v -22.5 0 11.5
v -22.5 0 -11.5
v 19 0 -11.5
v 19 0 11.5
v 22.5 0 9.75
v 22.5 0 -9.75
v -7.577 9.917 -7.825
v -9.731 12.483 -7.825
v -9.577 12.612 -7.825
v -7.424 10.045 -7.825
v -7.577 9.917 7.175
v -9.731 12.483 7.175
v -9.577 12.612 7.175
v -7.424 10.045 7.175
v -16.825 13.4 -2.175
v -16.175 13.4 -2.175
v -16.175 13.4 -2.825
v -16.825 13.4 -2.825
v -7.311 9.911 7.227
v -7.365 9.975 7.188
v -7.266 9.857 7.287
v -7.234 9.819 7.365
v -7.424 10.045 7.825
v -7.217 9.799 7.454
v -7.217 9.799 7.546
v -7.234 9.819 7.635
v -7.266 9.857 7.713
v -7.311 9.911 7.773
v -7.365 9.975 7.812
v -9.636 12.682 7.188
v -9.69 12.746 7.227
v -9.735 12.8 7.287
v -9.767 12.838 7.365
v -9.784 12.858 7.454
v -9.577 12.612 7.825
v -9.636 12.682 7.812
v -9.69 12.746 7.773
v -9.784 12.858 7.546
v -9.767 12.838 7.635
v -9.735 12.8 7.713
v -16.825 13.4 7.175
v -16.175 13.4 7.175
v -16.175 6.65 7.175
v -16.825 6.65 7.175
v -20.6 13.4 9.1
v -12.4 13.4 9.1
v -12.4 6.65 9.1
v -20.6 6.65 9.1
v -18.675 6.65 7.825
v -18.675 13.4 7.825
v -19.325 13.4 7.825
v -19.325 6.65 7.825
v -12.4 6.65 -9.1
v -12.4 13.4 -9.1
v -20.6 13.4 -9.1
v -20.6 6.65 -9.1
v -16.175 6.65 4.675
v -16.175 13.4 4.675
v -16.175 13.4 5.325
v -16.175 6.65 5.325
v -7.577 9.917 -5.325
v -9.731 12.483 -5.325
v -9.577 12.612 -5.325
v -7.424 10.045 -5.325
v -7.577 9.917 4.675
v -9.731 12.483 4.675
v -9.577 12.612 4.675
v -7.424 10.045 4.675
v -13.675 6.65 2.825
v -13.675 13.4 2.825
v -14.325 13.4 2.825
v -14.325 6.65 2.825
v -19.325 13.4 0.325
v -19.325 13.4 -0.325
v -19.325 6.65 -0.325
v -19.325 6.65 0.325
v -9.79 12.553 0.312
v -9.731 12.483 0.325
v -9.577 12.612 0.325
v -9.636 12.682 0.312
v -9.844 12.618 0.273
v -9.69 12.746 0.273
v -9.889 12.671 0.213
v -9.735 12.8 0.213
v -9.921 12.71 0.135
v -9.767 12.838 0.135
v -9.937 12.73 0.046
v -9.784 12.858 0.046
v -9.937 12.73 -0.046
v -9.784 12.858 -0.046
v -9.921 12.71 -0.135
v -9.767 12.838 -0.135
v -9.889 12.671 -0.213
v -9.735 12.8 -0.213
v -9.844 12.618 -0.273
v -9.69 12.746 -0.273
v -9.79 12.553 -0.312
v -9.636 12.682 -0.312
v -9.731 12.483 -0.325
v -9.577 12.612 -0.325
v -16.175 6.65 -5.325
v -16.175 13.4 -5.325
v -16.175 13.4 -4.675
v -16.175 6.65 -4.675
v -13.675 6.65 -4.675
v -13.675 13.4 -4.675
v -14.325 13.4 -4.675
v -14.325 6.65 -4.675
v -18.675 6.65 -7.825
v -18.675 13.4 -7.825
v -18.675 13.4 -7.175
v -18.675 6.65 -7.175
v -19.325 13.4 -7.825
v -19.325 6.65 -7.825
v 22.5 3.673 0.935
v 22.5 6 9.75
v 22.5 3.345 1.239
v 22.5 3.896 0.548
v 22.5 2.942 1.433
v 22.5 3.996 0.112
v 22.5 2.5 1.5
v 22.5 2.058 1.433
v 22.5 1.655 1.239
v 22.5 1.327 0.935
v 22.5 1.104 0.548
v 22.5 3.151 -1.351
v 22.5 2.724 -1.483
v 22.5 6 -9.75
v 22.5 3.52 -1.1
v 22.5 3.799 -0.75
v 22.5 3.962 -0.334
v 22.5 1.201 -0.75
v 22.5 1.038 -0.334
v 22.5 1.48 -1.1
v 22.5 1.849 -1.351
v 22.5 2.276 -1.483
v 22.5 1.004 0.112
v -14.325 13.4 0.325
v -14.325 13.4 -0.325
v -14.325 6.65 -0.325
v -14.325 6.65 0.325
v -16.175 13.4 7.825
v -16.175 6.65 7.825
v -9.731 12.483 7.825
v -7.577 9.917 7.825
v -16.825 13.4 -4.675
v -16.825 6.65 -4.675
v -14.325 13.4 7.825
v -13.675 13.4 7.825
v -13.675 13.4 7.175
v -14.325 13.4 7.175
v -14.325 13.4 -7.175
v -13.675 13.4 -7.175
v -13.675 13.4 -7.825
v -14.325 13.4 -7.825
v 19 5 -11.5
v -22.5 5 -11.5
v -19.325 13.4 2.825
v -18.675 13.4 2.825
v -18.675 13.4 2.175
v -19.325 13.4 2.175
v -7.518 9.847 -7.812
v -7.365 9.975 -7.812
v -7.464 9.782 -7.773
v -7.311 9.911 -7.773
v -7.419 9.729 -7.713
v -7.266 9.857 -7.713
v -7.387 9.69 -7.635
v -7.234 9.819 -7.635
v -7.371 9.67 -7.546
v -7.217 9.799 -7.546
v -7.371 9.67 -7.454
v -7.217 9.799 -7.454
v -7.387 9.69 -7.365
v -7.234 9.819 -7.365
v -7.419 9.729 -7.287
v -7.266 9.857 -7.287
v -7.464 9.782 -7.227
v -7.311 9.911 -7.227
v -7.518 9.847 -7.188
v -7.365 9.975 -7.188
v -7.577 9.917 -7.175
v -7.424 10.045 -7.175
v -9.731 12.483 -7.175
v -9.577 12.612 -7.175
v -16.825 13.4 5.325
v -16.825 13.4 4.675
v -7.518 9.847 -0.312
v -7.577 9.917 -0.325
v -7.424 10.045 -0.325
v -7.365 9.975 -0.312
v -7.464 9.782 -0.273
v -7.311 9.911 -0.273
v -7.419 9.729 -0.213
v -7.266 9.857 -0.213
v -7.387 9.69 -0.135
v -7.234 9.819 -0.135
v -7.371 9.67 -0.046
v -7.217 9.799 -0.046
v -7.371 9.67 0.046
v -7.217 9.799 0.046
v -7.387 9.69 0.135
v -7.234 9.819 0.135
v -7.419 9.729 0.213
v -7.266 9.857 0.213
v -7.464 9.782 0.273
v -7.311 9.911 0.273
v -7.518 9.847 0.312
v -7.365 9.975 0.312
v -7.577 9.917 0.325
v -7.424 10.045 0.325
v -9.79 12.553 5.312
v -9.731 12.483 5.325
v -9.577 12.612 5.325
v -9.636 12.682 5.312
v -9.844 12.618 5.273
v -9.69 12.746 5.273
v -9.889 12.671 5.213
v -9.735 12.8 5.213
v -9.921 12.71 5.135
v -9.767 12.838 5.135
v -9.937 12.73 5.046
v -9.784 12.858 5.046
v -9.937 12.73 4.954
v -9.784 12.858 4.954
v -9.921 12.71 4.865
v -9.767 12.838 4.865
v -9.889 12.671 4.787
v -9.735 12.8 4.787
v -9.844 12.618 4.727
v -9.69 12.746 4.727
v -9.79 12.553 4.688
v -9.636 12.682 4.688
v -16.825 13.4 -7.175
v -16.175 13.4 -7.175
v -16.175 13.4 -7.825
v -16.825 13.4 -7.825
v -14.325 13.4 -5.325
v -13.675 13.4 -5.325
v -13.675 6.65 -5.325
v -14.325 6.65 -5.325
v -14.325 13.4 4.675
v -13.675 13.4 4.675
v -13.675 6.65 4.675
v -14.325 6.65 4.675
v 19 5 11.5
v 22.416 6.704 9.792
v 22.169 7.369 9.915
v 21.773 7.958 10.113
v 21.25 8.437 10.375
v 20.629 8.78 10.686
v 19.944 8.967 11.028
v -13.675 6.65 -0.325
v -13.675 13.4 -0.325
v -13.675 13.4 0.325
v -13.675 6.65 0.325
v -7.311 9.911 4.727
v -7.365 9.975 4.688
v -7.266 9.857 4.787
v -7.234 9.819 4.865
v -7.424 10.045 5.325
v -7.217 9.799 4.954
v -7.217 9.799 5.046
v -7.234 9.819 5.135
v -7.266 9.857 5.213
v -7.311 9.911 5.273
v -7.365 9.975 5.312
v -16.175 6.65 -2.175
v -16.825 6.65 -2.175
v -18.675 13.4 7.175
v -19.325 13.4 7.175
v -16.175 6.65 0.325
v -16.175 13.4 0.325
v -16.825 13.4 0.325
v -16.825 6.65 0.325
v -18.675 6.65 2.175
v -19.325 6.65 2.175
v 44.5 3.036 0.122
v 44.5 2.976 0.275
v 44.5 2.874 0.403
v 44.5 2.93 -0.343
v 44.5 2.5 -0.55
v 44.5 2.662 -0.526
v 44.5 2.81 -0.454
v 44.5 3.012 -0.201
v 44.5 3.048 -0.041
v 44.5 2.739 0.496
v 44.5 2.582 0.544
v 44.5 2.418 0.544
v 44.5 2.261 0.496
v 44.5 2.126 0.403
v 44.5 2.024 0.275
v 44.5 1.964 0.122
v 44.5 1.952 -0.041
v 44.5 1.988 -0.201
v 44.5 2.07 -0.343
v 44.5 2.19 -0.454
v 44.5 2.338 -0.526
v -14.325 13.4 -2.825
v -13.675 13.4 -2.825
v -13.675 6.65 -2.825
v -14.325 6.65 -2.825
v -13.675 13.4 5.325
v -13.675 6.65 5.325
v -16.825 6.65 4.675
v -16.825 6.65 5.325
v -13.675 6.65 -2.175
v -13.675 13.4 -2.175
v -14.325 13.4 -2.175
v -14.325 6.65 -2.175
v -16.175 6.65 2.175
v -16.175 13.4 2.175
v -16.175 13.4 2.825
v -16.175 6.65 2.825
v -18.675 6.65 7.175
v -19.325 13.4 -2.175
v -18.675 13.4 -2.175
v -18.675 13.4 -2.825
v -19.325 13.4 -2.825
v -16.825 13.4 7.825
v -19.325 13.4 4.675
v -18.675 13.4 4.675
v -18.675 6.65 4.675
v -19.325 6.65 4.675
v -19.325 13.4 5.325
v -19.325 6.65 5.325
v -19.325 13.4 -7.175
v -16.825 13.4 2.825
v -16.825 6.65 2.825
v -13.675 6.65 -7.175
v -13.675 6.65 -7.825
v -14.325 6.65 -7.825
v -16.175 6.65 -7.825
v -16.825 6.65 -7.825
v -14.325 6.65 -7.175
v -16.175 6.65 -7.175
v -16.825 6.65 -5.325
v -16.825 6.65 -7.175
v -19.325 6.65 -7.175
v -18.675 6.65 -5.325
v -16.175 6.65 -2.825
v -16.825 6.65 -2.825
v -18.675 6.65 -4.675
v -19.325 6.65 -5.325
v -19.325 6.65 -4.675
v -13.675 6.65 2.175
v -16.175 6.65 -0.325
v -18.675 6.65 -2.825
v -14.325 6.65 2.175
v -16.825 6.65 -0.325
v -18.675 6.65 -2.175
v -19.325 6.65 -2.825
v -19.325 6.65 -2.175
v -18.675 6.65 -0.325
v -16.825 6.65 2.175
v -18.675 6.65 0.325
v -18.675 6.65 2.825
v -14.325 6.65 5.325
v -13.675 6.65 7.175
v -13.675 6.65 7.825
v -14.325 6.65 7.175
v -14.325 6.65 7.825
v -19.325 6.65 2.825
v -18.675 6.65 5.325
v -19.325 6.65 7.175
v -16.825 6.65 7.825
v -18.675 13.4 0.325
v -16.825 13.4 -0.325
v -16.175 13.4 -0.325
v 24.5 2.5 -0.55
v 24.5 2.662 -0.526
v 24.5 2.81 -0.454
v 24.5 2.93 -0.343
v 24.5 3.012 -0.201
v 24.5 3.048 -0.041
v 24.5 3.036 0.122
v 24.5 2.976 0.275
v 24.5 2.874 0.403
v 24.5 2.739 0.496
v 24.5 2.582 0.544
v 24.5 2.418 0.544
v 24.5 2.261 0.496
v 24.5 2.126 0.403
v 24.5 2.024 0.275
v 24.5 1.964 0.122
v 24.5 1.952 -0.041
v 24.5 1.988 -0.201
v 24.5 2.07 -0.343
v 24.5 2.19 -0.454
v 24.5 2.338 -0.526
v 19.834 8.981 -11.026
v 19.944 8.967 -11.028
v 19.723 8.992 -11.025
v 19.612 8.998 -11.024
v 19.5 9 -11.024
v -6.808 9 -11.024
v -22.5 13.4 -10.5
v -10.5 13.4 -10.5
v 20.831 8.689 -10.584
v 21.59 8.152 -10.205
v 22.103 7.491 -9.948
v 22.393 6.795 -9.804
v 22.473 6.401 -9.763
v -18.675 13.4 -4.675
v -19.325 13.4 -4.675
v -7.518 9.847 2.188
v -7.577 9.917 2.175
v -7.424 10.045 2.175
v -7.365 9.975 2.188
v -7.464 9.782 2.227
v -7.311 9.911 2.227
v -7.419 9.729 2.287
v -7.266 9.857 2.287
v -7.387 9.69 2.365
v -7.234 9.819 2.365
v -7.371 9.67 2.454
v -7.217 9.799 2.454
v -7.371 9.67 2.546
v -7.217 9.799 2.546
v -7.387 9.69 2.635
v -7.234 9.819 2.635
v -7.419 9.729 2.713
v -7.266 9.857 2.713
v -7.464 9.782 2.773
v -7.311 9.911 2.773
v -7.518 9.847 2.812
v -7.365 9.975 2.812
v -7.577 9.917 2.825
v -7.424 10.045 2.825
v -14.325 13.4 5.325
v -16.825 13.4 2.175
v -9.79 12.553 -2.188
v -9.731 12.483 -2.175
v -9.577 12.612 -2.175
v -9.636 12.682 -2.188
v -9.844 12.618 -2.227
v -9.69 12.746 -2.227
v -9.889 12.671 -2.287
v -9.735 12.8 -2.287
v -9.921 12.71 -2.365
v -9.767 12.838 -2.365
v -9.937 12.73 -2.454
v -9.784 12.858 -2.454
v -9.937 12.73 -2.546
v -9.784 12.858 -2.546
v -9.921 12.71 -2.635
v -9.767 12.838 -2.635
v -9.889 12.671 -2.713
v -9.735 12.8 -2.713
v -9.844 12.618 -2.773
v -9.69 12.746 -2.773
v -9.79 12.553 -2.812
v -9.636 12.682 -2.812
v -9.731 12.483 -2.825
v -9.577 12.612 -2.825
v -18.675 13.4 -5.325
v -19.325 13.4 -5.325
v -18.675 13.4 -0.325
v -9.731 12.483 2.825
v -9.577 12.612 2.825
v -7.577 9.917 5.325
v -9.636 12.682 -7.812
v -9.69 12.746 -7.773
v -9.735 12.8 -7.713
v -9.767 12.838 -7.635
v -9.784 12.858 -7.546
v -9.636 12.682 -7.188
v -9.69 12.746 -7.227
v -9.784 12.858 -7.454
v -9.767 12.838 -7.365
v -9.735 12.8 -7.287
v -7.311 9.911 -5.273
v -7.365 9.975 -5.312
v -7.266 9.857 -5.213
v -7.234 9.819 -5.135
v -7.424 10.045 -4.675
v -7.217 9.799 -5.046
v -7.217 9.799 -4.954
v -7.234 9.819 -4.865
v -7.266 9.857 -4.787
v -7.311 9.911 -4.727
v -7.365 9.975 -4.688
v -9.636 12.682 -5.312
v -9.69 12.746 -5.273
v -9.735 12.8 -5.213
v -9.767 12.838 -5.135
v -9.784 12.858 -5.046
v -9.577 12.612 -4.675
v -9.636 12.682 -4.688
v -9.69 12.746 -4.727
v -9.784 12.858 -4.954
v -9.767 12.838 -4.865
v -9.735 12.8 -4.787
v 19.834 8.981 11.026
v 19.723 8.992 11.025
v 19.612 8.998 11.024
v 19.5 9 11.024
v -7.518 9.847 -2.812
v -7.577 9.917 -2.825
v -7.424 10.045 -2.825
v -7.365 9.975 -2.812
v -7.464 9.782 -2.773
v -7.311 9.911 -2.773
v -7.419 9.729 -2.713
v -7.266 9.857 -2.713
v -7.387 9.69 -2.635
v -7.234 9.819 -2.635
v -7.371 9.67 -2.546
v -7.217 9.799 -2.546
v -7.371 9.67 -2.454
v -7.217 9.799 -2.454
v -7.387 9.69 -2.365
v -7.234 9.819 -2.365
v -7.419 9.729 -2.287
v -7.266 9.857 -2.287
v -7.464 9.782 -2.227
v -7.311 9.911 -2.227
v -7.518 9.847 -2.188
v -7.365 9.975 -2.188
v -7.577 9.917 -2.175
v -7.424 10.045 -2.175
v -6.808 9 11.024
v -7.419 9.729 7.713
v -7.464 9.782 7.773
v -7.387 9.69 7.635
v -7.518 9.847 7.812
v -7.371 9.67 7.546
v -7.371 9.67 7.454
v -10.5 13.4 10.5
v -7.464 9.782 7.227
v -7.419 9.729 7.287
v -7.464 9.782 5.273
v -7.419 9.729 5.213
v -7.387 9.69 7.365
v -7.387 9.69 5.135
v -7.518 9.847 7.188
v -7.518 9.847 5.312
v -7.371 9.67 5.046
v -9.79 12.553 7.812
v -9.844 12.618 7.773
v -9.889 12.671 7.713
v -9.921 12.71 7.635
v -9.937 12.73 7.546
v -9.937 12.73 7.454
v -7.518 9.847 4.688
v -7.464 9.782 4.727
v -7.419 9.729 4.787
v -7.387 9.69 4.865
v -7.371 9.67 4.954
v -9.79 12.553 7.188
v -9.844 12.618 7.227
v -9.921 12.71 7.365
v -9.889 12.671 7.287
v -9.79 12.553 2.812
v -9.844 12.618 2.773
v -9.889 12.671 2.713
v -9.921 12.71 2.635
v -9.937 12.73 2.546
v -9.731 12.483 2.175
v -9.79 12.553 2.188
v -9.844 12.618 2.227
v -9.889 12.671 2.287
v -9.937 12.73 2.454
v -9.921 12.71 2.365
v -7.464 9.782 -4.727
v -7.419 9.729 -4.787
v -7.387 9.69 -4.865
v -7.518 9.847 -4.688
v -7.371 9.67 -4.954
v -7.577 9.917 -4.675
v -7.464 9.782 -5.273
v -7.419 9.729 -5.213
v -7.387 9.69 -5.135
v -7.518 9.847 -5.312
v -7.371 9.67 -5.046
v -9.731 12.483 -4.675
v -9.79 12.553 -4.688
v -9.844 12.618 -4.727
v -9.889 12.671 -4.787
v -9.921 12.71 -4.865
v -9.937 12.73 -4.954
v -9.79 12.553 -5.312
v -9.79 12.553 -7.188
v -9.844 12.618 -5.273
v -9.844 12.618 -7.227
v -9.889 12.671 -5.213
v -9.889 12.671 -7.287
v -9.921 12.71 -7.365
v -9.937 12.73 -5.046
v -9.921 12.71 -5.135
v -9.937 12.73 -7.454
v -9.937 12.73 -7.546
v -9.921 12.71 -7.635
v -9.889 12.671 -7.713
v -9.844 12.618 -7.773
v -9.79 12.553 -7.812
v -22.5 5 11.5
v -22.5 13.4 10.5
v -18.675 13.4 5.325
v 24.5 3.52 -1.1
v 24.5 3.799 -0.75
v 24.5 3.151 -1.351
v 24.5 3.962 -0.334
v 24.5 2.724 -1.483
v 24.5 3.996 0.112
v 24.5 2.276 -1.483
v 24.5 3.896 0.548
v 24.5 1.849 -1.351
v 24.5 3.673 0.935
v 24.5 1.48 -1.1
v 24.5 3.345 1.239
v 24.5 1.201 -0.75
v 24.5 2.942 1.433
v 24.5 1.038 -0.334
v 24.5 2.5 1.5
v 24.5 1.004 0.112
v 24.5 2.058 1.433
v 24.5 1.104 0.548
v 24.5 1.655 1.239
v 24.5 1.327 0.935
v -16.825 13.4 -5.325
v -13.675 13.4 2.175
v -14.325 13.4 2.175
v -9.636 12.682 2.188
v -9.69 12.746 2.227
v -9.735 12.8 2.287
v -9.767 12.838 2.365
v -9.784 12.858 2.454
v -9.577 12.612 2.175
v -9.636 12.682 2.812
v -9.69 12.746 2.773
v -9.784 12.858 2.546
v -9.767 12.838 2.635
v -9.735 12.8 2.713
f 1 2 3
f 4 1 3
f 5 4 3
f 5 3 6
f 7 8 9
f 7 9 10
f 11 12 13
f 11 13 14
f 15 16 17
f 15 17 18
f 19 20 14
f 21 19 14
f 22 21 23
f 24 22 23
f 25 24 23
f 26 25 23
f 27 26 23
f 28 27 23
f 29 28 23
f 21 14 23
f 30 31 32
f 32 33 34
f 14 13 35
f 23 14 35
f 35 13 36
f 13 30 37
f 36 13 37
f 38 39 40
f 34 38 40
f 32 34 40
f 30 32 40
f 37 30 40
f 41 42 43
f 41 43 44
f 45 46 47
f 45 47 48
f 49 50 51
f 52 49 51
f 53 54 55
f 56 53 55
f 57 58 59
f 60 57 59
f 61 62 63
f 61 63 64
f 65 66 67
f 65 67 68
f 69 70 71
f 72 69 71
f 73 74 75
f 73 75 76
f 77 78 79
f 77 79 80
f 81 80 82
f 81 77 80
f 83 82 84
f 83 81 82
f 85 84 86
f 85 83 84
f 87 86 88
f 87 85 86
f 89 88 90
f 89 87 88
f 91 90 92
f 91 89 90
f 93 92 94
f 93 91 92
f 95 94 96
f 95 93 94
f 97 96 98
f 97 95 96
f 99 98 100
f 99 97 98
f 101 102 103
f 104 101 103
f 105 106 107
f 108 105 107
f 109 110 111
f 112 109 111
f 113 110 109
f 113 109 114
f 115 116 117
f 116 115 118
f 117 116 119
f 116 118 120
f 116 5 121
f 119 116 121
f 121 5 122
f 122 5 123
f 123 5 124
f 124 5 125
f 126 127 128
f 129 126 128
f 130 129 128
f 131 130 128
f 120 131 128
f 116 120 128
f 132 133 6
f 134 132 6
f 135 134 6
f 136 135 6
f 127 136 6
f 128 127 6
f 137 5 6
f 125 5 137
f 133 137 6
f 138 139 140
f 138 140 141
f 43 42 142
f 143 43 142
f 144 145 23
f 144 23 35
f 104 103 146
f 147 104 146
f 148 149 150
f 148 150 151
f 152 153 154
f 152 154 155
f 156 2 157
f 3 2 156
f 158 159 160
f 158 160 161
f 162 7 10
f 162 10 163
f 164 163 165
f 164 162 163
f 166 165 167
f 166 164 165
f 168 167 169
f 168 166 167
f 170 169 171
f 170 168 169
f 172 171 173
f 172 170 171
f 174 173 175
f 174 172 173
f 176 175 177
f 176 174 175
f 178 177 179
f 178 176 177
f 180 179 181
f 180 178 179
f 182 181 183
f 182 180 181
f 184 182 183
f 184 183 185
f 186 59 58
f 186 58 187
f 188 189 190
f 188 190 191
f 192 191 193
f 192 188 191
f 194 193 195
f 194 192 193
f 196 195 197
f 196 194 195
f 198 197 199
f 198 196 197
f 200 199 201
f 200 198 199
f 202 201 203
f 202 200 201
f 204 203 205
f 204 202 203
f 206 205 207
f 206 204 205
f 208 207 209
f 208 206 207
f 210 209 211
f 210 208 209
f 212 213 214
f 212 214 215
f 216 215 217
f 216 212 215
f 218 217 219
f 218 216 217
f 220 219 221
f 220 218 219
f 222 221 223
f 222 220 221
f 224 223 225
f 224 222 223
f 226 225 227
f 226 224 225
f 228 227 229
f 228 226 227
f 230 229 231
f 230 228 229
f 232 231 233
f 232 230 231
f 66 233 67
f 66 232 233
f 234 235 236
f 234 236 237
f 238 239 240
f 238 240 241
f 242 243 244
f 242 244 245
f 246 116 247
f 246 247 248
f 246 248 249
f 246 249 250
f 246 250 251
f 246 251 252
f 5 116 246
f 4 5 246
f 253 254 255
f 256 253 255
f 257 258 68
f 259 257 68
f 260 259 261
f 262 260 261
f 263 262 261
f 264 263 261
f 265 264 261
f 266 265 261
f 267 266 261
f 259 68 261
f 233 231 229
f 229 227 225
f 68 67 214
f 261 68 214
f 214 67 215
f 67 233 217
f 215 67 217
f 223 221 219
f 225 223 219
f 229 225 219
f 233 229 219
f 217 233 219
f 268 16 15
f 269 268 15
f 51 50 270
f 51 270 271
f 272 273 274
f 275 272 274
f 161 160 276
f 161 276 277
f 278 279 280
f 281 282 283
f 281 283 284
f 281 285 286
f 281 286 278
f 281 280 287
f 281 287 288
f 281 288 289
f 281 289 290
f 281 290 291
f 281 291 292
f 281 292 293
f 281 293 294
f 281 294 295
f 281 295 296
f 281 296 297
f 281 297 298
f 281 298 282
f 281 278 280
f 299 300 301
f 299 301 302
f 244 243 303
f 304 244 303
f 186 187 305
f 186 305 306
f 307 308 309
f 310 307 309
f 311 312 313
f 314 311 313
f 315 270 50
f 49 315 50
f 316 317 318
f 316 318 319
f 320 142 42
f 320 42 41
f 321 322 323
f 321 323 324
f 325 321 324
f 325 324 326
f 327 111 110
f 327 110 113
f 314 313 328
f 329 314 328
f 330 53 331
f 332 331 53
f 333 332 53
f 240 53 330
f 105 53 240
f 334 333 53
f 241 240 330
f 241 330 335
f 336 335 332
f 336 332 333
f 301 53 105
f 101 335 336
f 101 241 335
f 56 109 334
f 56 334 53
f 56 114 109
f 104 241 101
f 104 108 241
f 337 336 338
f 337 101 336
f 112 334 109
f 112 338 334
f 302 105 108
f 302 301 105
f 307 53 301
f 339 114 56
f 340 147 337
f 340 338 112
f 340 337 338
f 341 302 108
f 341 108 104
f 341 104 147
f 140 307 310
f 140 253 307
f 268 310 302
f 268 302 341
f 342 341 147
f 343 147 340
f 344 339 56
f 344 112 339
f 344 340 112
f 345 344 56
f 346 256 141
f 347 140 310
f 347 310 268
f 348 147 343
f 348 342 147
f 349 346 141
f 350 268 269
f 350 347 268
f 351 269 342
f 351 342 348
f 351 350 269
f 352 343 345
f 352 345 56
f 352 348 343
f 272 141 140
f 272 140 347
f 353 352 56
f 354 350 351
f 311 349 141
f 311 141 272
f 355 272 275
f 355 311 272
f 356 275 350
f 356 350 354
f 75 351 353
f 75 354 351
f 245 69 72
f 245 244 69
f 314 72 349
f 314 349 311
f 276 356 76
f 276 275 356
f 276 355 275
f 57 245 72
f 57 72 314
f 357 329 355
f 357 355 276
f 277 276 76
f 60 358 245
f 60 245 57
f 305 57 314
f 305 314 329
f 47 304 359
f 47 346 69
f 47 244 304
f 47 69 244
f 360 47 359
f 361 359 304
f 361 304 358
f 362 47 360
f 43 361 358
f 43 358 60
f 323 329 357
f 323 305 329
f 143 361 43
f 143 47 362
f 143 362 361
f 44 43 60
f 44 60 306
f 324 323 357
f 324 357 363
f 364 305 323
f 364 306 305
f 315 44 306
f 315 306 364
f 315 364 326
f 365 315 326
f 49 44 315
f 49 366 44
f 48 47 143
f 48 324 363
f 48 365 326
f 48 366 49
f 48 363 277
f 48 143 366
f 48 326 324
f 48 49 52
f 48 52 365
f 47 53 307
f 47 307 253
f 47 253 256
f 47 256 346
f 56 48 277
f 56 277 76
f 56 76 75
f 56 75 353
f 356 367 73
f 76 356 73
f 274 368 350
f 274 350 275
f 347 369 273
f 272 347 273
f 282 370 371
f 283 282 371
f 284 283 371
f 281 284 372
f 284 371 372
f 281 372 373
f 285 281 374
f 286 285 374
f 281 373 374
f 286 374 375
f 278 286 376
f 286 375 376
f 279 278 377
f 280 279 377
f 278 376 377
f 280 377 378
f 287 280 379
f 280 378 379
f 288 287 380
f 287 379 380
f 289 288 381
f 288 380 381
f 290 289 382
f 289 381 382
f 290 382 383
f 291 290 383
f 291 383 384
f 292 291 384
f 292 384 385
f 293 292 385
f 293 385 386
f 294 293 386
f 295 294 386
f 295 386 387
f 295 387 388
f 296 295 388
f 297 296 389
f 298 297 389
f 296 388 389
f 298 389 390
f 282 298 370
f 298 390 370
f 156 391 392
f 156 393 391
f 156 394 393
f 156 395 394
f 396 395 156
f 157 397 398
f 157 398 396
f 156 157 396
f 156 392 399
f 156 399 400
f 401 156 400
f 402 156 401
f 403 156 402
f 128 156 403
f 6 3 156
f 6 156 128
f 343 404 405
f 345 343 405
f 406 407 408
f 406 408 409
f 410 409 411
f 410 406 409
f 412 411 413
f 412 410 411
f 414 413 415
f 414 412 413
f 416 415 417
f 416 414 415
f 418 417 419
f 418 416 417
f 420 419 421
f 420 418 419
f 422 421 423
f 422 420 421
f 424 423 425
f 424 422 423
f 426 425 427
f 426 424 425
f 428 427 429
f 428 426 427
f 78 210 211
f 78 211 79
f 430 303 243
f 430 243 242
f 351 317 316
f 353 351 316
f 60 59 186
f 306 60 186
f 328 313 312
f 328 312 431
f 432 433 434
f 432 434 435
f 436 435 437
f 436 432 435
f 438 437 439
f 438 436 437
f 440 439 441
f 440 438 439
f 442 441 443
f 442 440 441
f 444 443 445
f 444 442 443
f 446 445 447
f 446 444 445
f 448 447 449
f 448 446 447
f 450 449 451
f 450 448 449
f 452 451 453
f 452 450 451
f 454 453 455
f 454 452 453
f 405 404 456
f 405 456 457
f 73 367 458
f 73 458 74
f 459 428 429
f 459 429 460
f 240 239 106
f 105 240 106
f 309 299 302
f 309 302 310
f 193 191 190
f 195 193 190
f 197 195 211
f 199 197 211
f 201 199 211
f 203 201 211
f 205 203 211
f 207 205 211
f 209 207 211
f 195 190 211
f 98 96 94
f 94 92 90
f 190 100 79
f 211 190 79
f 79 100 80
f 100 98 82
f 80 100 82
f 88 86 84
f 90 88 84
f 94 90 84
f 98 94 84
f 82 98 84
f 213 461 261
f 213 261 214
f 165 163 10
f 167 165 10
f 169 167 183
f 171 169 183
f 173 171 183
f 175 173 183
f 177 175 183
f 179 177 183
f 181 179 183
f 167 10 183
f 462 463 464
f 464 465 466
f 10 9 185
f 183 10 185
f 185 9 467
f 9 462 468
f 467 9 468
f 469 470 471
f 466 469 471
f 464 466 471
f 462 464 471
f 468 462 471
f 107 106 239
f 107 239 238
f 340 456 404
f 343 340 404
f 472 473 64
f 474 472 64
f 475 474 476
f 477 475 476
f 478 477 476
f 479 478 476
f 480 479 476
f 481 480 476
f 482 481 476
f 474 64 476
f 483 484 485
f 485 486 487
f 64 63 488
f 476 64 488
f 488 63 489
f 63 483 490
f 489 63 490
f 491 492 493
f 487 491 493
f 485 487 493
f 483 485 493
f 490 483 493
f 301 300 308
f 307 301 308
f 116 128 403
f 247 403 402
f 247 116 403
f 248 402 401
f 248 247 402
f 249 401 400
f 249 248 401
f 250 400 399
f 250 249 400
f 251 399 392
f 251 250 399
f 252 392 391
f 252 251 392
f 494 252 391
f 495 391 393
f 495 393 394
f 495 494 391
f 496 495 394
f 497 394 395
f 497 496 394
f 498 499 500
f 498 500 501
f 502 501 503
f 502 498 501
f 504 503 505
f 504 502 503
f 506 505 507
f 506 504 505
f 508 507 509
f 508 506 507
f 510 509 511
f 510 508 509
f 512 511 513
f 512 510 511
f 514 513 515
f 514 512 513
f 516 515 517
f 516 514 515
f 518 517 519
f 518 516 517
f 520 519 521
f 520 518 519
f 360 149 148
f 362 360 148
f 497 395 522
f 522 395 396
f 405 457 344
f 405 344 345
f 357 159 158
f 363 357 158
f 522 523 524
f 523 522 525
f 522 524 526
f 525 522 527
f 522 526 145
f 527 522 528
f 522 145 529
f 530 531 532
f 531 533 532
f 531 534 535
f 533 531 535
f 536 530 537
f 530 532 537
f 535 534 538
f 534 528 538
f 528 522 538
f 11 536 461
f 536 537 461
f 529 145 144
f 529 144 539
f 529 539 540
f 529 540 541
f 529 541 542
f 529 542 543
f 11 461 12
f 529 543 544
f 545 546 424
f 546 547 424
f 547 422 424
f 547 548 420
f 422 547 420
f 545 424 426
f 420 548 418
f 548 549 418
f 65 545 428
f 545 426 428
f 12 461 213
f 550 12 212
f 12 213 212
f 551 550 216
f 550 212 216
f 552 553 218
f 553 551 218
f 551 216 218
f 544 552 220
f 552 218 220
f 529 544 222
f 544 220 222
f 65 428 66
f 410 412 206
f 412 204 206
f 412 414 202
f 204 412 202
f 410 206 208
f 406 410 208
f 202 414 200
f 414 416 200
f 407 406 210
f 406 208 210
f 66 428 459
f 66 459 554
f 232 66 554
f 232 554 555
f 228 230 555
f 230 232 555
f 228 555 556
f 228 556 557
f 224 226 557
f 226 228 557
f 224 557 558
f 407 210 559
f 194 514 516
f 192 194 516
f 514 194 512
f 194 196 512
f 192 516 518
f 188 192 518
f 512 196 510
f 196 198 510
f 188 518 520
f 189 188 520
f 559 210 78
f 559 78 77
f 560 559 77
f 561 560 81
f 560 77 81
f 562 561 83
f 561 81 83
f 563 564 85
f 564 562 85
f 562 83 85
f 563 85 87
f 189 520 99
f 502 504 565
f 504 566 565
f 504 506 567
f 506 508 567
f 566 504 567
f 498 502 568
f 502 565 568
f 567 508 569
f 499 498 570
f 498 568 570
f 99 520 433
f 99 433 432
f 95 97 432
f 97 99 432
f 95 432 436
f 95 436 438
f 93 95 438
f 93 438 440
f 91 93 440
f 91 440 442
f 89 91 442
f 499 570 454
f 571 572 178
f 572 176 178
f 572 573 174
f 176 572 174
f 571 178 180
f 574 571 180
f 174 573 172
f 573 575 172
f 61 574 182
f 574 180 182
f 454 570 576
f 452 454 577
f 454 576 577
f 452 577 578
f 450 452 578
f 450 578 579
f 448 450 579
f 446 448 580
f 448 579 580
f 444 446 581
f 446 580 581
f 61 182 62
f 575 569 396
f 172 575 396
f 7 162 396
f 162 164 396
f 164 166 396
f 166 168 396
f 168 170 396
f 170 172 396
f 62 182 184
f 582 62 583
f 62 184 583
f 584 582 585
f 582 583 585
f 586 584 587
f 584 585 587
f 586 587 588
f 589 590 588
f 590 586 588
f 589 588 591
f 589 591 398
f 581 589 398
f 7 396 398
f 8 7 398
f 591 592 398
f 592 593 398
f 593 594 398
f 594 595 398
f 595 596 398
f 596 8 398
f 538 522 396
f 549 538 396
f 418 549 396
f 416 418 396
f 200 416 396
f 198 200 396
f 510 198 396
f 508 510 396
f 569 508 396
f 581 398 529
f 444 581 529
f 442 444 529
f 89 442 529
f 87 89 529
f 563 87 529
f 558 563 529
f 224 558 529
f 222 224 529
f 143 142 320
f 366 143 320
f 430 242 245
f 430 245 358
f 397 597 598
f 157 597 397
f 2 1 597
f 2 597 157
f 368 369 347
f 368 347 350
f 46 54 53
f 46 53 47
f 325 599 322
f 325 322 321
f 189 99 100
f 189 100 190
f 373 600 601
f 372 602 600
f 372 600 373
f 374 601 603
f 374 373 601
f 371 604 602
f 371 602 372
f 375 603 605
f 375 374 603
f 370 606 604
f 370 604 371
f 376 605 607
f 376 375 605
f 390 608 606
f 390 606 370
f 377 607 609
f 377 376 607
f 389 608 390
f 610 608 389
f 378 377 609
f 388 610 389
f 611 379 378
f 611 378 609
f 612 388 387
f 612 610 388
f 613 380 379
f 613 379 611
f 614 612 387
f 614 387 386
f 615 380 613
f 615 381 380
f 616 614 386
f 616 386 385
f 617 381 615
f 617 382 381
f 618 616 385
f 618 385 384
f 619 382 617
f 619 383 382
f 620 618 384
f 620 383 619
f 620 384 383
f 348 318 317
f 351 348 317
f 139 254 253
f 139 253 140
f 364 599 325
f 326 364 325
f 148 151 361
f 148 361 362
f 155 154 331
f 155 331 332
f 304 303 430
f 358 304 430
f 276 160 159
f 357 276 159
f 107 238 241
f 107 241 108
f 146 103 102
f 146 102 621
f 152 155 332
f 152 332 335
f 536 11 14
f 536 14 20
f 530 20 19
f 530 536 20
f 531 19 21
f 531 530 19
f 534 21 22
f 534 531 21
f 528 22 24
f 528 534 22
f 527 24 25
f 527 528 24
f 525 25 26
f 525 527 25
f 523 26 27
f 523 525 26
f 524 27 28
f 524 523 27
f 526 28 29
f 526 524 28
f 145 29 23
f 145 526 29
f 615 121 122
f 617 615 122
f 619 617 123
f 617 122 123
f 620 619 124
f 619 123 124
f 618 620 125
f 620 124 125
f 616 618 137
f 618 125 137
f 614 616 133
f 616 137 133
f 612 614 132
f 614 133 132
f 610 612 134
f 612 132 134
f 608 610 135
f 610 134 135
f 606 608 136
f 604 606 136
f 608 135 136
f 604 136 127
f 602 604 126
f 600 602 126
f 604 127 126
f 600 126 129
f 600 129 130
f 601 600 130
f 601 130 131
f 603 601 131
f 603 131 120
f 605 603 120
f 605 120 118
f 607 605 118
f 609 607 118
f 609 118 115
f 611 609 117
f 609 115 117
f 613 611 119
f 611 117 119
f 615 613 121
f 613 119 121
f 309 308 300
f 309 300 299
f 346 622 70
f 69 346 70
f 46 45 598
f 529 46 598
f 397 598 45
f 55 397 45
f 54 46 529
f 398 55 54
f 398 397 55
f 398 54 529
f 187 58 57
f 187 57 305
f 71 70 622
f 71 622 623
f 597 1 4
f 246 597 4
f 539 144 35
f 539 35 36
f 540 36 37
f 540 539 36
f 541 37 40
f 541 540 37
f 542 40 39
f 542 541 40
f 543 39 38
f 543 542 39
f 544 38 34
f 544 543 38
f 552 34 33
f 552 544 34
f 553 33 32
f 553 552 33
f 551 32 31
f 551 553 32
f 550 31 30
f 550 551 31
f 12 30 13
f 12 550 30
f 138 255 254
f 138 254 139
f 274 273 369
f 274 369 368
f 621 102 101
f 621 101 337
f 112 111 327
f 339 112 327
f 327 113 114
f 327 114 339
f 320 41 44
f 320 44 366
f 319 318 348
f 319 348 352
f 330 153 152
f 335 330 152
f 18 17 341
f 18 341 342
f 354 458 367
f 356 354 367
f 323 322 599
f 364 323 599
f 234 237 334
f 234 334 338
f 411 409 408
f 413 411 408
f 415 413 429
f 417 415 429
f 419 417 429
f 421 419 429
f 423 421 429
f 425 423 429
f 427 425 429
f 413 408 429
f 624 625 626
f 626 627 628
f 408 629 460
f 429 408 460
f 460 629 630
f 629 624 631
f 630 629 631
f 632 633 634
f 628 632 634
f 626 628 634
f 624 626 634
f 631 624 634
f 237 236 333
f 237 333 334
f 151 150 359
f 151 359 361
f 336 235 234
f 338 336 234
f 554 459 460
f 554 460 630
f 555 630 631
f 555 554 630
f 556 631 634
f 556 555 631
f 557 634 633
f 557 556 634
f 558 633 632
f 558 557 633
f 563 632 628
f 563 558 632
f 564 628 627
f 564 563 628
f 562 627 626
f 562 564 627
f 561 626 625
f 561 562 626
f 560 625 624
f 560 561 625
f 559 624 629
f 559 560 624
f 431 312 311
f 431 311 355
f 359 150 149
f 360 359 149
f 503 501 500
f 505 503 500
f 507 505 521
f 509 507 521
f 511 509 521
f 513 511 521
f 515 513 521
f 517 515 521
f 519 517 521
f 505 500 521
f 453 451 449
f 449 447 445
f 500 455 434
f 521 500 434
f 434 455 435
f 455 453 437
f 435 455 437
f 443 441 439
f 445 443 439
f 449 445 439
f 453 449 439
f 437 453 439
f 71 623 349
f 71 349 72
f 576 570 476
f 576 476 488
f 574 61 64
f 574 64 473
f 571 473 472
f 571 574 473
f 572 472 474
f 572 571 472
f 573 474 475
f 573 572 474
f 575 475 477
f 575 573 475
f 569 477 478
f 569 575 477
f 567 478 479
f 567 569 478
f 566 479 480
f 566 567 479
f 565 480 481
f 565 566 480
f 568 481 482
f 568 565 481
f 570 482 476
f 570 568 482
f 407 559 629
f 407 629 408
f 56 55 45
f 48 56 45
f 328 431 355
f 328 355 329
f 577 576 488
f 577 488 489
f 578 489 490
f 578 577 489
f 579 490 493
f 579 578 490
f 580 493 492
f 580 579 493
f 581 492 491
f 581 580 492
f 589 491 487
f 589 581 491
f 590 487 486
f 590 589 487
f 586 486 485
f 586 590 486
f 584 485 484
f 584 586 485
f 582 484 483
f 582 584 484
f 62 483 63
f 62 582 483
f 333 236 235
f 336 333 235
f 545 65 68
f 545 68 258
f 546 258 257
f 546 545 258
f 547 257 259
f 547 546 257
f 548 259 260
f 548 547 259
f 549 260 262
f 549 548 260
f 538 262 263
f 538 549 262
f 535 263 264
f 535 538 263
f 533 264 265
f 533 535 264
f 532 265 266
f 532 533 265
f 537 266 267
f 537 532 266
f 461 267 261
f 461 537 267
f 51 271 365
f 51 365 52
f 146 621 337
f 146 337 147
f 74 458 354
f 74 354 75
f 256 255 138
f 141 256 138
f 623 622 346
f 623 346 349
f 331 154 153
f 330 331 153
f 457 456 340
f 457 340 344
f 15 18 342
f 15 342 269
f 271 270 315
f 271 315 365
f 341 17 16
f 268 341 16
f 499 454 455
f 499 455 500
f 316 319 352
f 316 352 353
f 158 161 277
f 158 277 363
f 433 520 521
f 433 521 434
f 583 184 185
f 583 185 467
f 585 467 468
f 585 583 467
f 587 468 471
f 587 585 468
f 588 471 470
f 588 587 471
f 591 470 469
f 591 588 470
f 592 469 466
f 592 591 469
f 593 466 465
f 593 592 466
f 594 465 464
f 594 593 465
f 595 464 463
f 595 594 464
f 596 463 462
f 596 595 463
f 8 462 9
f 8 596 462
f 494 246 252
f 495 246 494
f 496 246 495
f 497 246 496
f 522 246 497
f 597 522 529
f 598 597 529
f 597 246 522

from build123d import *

# Parameters (mm, degrees)
ESQUISSE1_W                     = 45
ESQUISSE1_H                     = 23
EXTRUSION1_DEPTH                = 13.4
ENL_V_MAT_EXTRU_1_DEPTH         = 29.601748198
ENL_V_MAT_EXTRU_1_DEPTH_BACK    = 29.601748198
ENL_V_MAT_EXTRU_2_DEPTH         = 29.601748198
ENL_V_MAT_EXTRU_2_DEPTH_BACK    = 29.601748198
CONG_1_R                        = 3
ENL_V_MAT_EXTRU_3_DEPTH         = 29.601748198
ENL_V_MAT_EXTRU_3_DEPTH_BACK    = 29.601748198
ESQUISSE5_W                     = 8.2
ESQUISSE5_H                     = 18.2
ENL_V_MAT_EXTRU_4_DEPTH         = 6.75
ESQUISSE6_R                     = 1.5
EXTRUSION2_DEPTH                = 2
ESQUISSE7_R                     = 0.55
EXTRUSION3_DEPTH                = 20
EXTRUSION4_REACH                = 49.875
ESQUISSE8_W                     = 0.65
ESQUISSE8_H                     = 0.65
R_P_TITION_LIN_AIRE1_COUNT      = 3
R_P_TITION_LIN_AIRE1_PITCH      = 2.5
R_P_TITION_LIN_AIRE1_COUNT_DIR2 = 7
R_P_TITION_LIN_AIRE1_PITCH_DIR2 = 2.5
EXTRUSION5_DEPTH                = 0.2
R_P_TITION_LIN_AIRE2_COUNT      = 7
R_P_TITION_LIN_AIRE2_PITCH      = 2.5


with BuildPart() as part:
    # Esquisse1 → Extrusion1 (new body)
    with BuildSketch(Plane(origin=(0, 0, 0), x_dir=(1, 0, 0), z_dir=(0, 1, 0))):
        Rectangle(ESQUISSE1_W, ESQUISSE1_H)
    extrude(amount=EXTRUSION1_DEPTH)

    # Esquisse2 → Enlèv. mat.-Extru.1 (cut, two sides: drawn at the far end of the back side and taken through both)
    with BuildSketch(Plane.XY.offset(-ENL_V_MAT_EXTRU_1_DEPTH_BACK)):
        Polygon((22.5, 13.4), (22.5, 9), (-6.807961623, 9), (-10.5, 13.4), align=None)
    extrude(amount=ENL_V_MAT_EXTRU_1_DEPTH + ENL_V_MAT_EXTRU_1_DEPTH_BACK, mode=Mode.SUBTRACT)

    # Esquisse3 → Enlèv. mat.-Extru.2 (cut, two sides: drawn at the far end of the back side and taken through both)
    with BuildSketch(Plane(origin=(0, 0, 0), x_dir=(0, 0, -1), z_dir=(1, 0, 0)).offset(-ENL_V_MAT_EXTRU_2_DEPTH_BACK)):
        Polygon((18.471230279, -53.558334344), (11.5, 5), (10.5, 13.4), (-10.5, 13.4), (-11.5, 5), (-18.471230279, -53.558334344), (-18.471230279, 64.385322929), (18.471230279, 64.385322929), align=None)
    extrude(amount=ENL_V_MAT_EXTRU_2_DEPTH + ENL_V_MAT_EXTRU_2_DEPTH_BACK, mode=Mode.SUBTRACT)

    # Congé1
    cong_1_edges = [part.edges().sort_by_distance(p)[0] for p in [
        (22.5, 9, 0),
    ]]
    fillet(cong_1_edges, radius=CONG_1_R)

    # Esquisse4 → Enlèv. mat.-Extru.3 (cut, two sides: drawn at the far end of the back side and taken through both)
    with BuildSketch(Plane(origin=(0, 0, 0), x_dir=(1, 0, 0), z_dir=(0, 1, 0)).offset(-ENL_V_MAT_EXTRU_3_DEPTH_BACK)):
        Polygon((133.574230148, 11.5), (22.5, 11.5), (19, 11.5), (42, 0), (19, -11.5), (22.5, -11.5), (133.574230148, -11.5), (355.722690444, -11.5), (355.722690444, 11.5), align=None)
    extrude(amount=ENL_V_MAT_EXTRU_3_DEPTH + ENL_V_MAT_EXTRU_3_DEPTH_BACK, mode=Mode.SUBTRACT)

    # Esquisse5 → Enlèv. mat.-Extru.4 (cut)
    with BuildSketch(Plane(origin=(0, 13.4, 0), x_dir=(-1, 0, 0), z_dir=(0, 1, 0))):
        with Locations((16.5, 0)):
            Rectangle(ESQUISSE5_W, ESQUISSE5_H)
    extrude(amount=-ENL_V_MAT_EXTRU_4_DEPTH, mode=Mode.SUBTRACT)

    # Esquisse6 → Extrusion2 (add)
    with BuildSketch(Plane(origin=(22.5, 0, 0), x_dir=(0, 0, -1), z_dir=(1, 0, 0))):
        with Locations(Location((0, 2.5, 0), (0, 0, 180))):
            Circle(ESQUISSE6_R)
    extrude(amount=EXTRUSION2_DEPTH)

    # Esquisse7 → Extrusion3 (add)
    with BuildSketch(Plane(origin=(24.5, 0, 0), x_dir=(0, 0, -1), z_dir=(1, 0, 0))):
        with Locations((0, 2.5)):
            Circle(ESQUISSE7_R)
    extrude(amount=EXTRUSION3_DEPTH)

    # Esquisse8 → Extrusion4 (add, up to next)
    with BuildSketch(Plane(origin=(0, 13.4, 0), x_dir=(-1, 0, 0), z_dir=(0, 1, 0)), mode=Mode.PRIVATE) as extrusion4_sk1:
        with Locations((14, -7.5)):
            Rectangle(ESQUISSE8_W, ESQUISSE8_H)
    extrusion4_tool1 = extrude(extrusion4_sk1.sketch, amount=-EXTRUSION4_REACH, mode=Mode.PRIVATE) - part.part
    extrusion4 = extrusion4_tool1.solids().sort_by_distance((-14, 13.4, -7.5))[0]
    add(extrusion4)

    # Répétition linéaire1: Extrusion4 3 × 7
    with Locations(*[(-i * R_P_TITION_LIN_AIRE1_PITCH, 0, j * R_P_TITION_LIN_AIRE1_PITCH_DIR2) for i in range(R_P_TITION_LIN_AIRE1_COUNT) for j in range(R_P_TITION_LIN_AIRE1_COUNT_DIR2) if (i, j) != (0, 0)]):
        add(extrusion4)

    # Esquisse9 → Extrusion5 (add)
    with BuildSketch(Plane(origin=(0.436559012, 0.366316506, 0), x_dir=(0, 0, -1), z_dir=(0.766044443118982, 0.6427876096865347, 0))):
        with BuildLine():
            Line((7.175, 12.467369403), (7.175, 15.817369403))
            ThreePointArc((7.175, 15.817369403), (7.5, 16.142369403), (7.825, 15.817369403))
            Line((7.825, 15.817369403), (7.825, 12.467369403))
            ThreePointArc((7.825, 12.467369403), (7.5, 12.142369403), (7.175, 12.467369403))
        make_face()
    extrusion5 = extrude(amount=EXTRUSION5_DEPTH)

    # Répétition linéaire2: Extrusion5 ×7
    with Locations(*[(0, 0, i * R_P_TITION_LIN_AIRE2_PITCH) for i in range(1, R_P_TITION_LIN_AIRE2_COUNT)]):
        add(extrusion5)


solid = part.part
